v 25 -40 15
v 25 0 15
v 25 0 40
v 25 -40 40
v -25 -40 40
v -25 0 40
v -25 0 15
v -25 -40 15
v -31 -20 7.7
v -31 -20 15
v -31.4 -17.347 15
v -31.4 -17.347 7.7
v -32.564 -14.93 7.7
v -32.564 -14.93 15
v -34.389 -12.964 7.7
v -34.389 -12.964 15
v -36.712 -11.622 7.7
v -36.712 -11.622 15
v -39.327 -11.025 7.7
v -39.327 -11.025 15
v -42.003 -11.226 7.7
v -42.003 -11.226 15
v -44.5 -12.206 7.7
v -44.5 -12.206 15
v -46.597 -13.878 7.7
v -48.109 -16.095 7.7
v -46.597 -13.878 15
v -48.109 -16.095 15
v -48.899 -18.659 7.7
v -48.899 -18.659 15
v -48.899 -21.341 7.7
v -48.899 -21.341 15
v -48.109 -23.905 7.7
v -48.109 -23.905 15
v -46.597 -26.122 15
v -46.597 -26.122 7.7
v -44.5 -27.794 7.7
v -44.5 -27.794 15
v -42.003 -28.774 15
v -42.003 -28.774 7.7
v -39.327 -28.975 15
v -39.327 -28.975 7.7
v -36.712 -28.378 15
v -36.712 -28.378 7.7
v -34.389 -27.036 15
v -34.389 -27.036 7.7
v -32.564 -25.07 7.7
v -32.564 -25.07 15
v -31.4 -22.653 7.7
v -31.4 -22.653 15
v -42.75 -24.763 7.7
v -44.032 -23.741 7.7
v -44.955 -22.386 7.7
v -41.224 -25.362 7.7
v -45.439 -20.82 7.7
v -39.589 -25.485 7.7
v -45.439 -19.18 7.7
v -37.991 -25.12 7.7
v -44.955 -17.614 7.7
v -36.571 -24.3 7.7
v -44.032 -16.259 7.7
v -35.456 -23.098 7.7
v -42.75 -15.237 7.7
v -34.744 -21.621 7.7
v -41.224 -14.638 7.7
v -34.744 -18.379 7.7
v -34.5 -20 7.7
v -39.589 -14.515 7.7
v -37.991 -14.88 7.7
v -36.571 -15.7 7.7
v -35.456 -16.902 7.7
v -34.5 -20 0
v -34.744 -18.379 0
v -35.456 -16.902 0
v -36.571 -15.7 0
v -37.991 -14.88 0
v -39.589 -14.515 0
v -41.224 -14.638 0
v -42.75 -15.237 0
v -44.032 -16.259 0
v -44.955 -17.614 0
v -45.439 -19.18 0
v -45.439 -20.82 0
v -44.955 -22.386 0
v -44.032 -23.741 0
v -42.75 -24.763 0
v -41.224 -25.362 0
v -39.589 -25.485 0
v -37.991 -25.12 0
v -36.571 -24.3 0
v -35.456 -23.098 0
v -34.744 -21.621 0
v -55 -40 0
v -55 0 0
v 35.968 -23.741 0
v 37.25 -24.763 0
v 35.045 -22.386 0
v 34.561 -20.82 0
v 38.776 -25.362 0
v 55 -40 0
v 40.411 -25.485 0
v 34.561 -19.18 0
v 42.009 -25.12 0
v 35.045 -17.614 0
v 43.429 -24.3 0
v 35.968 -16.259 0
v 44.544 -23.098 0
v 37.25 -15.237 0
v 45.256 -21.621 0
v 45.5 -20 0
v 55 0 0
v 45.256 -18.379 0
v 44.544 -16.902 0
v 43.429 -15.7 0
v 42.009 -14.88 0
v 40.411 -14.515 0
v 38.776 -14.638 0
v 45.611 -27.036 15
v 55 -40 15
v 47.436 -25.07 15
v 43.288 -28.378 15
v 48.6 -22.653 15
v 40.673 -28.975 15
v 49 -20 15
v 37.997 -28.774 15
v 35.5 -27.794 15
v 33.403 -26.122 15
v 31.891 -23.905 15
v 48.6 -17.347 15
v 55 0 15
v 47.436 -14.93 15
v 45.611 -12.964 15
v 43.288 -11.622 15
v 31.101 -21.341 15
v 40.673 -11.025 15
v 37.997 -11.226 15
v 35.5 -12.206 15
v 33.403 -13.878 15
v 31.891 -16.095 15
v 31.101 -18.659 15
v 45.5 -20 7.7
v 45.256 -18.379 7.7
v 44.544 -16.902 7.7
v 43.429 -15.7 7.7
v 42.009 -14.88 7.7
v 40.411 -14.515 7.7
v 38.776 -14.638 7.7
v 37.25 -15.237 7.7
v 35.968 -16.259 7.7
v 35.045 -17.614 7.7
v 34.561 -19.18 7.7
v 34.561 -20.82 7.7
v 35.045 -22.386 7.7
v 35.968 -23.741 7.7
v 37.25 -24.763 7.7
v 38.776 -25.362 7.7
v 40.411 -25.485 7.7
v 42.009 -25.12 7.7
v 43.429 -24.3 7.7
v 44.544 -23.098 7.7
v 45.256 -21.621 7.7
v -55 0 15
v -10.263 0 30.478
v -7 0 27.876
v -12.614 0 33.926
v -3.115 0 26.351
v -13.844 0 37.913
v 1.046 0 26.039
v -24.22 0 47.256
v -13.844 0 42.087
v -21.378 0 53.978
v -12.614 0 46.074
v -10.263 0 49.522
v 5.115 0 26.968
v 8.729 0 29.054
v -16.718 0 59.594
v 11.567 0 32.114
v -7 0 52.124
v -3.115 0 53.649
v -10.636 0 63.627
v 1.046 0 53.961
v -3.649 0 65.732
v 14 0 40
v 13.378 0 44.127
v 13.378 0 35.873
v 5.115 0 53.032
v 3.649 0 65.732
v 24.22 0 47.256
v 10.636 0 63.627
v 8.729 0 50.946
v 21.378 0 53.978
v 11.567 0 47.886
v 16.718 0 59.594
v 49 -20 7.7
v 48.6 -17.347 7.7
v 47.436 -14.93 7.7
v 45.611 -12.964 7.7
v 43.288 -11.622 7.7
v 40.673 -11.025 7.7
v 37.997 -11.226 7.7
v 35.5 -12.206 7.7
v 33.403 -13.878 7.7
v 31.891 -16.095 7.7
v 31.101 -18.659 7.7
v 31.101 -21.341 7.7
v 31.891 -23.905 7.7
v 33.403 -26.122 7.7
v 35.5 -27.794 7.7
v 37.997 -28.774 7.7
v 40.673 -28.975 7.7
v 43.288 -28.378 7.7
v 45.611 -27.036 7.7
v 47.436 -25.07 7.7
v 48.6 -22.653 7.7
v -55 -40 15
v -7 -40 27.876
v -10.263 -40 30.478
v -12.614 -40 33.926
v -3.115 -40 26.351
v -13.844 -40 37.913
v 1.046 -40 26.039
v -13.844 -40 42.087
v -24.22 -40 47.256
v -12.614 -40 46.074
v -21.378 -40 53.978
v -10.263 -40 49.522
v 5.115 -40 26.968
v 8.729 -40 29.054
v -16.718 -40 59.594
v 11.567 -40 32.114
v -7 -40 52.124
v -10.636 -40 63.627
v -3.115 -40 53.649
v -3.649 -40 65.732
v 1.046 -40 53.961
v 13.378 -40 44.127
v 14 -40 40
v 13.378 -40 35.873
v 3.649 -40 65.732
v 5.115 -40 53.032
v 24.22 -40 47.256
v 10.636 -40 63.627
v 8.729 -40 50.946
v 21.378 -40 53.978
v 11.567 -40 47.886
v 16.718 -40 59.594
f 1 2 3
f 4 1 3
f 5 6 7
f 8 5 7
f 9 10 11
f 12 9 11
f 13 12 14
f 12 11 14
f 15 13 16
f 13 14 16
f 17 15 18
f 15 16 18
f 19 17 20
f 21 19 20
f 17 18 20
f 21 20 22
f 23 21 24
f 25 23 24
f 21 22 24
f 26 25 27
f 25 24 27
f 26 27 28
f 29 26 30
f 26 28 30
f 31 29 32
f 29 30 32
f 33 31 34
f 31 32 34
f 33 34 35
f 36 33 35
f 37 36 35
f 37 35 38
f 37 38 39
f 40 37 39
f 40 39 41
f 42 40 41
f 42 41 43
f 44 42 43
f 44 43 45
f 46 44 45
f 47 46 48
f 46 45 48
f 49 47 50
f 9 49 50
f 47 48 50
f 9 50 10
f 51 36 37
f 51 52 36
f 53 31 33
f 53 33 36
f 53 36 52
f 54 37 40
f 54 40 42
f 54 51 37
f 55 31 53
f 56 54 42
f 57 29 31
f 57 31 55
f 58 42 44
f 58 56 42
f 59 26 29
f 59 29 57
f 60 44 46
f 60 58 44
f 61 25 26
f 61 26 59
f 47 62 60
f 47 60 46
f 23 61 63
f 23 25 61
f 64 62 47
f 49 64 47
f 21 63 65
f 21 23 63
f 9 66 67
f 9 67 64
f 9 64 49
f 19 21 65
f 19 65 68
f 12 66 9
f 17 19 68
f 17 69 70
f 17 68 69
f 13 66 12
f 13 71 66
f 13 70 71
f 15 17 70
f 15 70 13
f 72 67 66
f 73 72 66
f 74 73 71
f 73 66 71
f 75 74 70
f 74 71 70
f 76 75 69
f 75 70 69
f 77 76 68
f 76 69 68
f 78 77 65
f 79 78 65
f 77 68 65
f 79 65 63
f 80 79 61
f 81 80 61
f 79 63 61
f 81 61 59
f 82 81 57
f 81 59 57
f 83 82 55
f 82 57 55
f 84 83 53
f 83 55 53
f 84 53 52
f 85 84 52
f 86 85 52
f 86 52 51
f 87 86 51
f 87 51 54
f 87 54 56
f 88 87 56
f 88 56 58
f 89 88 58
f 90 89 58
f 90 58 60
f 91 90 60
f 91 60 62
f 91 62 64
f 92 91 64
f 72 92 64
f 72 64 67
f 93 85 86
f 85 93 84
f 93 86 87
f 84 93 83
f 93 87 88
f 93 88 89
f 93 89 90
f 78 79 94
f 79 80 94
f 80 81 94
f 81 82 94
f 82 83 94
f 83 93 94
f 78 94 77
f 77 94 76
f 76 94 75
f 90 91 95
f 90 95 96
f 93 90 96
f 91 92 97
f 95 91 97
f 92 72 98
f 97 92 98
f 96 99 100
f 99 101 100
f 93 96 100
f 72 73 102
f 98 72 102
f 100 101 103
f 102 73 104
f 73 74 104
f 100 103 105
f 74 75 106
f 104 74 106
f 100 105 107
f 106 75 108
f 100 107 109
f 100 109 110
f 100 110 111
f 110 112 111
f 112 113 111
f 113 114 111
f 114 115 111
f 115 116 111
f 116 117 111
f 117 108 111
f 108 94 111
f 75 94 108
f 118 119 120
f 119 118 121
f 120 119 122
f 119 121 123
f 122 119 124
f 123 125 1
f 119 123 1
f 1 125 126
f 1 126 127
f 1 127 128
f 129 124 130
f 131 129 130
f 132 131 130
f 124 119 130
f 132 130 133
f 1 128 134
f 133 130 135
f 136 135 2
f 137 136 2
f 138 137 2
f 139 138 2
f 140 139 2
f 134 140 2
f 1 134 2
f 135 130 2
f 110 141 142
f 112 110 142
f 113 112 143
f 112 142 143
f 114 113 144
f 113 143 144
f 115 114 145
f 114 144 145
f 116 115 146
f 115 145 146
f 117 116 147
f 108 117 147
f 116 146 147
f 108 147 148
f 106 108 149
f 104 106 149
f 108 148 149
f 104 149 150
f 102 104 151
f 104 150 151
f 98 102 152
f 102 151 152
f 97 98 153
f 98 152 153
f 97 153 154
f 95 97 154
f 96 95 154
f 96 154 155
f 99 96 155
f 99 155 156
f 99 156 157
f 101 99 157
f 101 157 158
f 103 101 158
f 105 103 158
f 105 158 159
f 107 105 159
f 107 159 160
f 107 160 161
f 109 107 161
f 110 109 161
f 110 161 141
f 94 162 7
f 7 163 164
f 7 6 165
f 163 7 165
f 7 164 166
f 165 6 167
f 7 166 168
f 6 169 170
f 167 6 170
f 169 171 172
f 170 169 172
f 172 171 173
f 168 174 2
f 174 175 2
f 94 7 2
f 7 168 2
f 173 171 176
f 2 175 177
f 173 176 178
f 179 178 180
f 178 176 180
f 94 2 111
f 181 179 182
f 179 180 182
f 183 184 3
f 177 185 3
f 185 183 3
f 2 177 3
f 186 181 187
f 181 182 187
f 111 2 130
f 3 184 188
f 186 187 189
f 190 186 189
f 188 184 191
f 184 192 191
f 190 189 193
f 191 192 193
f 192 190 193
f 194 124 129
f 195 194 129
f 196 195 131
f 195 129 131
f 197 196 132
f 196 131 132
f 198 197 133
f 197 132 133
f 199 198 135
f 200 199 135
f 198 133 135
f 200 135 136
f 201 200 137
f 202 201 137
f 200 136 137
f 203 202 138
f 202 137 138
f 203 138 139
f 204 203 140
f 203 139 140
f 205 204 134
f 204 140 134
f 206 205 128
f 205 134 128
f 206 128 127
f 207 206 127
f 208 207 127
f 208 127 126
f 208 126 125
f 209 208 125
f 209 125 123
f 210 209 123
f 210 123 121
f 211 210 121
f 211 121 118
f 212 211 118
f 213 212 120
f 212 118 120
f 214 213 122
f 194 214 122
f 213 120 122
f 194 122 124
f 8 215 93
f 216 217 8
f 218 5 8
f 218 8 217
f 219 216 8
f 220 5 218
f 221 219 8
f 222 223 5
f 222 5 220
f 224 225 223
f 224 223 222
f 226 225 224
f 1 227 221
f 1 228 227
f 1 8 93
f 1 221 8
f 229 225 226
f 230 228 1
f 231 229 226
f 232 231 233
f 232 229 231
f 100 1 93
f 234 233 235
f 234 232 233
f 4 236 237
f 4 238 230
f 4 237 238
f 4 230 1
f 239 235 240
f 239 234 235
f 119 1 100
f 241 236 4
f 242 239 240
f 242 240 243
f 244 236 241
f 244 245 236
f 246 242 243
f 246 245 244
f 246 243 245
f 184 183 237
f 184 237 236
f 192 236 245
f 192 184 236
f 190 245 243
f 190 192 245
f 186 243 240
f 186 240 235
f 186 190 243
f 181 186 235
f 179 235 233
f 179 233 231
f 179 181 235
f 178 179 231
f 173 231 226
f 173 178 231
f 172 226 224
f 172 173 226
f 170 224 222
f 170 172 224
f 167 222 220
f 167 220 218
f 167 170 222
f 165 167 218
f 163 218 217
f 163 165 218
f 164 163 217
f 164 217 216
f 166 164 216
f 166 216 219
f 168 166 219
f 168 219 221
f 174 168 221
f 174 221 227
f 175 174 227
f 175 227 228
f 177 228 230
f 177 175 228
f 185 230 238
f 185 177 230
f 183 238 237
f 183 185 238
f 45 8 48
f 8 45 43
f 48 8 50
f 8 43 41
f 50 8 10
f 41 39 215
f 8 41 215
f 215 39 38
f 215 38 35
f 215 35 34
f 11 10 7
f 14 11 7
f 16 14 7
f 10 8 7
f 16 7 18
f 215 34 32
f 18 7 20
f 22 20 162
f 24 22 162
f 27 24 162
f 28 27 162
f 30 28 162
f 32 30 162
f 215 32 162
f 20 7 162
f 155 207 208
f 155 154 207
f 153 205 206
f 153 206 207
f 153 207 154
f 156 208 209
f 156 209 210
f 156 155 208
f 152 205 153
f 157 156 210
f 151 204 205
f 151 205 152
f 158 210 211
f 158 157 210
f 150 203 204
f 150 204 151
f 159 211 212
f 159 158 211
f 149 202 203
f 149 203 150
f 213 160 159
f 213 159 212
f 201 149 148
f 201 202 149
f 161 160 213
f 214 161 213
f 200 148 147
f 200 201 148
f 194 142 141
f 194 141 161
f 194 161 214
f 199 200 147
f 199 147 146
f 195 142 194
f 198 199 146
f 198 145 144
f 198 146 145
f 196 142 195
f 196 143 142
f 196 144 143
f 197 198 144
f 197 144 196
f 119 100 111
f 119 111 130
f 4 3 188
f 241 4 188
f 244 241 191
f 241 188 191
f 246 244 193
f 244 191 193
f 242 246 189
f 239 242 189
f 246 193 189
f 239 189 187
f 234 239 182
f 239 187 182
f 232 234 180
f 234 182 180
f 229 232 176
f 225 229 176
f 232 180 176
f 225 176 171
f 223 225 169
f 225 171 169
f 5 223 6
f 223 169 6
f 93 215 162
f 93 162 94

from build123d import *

# Parameters (mm, degrees)
F0_R     = 14
F1_DEPTH = 40
F2_R     = 5.5
F3_DEPTH = 15
F2_R_2   = 9
F4_DEPTH = 7.3


with BuildPart() as f1:
    # F0 (on Front) → F1 (new body)
    with BuildSketch(Plane.XZ):
        with BuildLine():
            Line((-55, 0), (0, 0))
            Line((0, 0), (55, 0))
            Line((55, 0), (55, 15))
            Line((55, 15), (25, 15))
            Line((25, 15), (25, 40))
            ThreePointArc((25, 40), (0, 66), (-25, 40))
            Line((-25, 40), (-25, 15))
            Line((-25, 15), (-55, 15))
            Line((-55, 15), (-55, 0))
        make_face()
        with Locations((0, 40)):
            Circle(F0_R, mode=Mode.SUBTRACT)
    extrude(amount=F1_DEPTH)

    # F2 (on face) → F3 (cut)
    with BuildSketch(Plane.XY.offset(15)):
        with Locations((40, -20)):
            Circle(F2_R)
        with Locations((-40, -20)):
            Circle(F2_R)
    extrude(amount=-F3_DEPTH, mode=Mode.SUBTRACT)

    # F2 (on face) → F4 (cut)
    with BuildSketch(Plane.XY.offset(15)):
        with Locations((40, -20)):
            Circle(F2_R_2)
        with Locations((40, -20)):
            Circle(F2_R, mode=Mode.SUBTRACT)
        with Locations((-40, -20)):
            Circle(F2_R_2)
        with Locations((-40, -20)):
            Circle(F2_R, mode=Mode.SUBTRACT)
    extrude(amount=-F4_DEPTH, mode=Mode.SUBTRACT)


solid = f1.part
